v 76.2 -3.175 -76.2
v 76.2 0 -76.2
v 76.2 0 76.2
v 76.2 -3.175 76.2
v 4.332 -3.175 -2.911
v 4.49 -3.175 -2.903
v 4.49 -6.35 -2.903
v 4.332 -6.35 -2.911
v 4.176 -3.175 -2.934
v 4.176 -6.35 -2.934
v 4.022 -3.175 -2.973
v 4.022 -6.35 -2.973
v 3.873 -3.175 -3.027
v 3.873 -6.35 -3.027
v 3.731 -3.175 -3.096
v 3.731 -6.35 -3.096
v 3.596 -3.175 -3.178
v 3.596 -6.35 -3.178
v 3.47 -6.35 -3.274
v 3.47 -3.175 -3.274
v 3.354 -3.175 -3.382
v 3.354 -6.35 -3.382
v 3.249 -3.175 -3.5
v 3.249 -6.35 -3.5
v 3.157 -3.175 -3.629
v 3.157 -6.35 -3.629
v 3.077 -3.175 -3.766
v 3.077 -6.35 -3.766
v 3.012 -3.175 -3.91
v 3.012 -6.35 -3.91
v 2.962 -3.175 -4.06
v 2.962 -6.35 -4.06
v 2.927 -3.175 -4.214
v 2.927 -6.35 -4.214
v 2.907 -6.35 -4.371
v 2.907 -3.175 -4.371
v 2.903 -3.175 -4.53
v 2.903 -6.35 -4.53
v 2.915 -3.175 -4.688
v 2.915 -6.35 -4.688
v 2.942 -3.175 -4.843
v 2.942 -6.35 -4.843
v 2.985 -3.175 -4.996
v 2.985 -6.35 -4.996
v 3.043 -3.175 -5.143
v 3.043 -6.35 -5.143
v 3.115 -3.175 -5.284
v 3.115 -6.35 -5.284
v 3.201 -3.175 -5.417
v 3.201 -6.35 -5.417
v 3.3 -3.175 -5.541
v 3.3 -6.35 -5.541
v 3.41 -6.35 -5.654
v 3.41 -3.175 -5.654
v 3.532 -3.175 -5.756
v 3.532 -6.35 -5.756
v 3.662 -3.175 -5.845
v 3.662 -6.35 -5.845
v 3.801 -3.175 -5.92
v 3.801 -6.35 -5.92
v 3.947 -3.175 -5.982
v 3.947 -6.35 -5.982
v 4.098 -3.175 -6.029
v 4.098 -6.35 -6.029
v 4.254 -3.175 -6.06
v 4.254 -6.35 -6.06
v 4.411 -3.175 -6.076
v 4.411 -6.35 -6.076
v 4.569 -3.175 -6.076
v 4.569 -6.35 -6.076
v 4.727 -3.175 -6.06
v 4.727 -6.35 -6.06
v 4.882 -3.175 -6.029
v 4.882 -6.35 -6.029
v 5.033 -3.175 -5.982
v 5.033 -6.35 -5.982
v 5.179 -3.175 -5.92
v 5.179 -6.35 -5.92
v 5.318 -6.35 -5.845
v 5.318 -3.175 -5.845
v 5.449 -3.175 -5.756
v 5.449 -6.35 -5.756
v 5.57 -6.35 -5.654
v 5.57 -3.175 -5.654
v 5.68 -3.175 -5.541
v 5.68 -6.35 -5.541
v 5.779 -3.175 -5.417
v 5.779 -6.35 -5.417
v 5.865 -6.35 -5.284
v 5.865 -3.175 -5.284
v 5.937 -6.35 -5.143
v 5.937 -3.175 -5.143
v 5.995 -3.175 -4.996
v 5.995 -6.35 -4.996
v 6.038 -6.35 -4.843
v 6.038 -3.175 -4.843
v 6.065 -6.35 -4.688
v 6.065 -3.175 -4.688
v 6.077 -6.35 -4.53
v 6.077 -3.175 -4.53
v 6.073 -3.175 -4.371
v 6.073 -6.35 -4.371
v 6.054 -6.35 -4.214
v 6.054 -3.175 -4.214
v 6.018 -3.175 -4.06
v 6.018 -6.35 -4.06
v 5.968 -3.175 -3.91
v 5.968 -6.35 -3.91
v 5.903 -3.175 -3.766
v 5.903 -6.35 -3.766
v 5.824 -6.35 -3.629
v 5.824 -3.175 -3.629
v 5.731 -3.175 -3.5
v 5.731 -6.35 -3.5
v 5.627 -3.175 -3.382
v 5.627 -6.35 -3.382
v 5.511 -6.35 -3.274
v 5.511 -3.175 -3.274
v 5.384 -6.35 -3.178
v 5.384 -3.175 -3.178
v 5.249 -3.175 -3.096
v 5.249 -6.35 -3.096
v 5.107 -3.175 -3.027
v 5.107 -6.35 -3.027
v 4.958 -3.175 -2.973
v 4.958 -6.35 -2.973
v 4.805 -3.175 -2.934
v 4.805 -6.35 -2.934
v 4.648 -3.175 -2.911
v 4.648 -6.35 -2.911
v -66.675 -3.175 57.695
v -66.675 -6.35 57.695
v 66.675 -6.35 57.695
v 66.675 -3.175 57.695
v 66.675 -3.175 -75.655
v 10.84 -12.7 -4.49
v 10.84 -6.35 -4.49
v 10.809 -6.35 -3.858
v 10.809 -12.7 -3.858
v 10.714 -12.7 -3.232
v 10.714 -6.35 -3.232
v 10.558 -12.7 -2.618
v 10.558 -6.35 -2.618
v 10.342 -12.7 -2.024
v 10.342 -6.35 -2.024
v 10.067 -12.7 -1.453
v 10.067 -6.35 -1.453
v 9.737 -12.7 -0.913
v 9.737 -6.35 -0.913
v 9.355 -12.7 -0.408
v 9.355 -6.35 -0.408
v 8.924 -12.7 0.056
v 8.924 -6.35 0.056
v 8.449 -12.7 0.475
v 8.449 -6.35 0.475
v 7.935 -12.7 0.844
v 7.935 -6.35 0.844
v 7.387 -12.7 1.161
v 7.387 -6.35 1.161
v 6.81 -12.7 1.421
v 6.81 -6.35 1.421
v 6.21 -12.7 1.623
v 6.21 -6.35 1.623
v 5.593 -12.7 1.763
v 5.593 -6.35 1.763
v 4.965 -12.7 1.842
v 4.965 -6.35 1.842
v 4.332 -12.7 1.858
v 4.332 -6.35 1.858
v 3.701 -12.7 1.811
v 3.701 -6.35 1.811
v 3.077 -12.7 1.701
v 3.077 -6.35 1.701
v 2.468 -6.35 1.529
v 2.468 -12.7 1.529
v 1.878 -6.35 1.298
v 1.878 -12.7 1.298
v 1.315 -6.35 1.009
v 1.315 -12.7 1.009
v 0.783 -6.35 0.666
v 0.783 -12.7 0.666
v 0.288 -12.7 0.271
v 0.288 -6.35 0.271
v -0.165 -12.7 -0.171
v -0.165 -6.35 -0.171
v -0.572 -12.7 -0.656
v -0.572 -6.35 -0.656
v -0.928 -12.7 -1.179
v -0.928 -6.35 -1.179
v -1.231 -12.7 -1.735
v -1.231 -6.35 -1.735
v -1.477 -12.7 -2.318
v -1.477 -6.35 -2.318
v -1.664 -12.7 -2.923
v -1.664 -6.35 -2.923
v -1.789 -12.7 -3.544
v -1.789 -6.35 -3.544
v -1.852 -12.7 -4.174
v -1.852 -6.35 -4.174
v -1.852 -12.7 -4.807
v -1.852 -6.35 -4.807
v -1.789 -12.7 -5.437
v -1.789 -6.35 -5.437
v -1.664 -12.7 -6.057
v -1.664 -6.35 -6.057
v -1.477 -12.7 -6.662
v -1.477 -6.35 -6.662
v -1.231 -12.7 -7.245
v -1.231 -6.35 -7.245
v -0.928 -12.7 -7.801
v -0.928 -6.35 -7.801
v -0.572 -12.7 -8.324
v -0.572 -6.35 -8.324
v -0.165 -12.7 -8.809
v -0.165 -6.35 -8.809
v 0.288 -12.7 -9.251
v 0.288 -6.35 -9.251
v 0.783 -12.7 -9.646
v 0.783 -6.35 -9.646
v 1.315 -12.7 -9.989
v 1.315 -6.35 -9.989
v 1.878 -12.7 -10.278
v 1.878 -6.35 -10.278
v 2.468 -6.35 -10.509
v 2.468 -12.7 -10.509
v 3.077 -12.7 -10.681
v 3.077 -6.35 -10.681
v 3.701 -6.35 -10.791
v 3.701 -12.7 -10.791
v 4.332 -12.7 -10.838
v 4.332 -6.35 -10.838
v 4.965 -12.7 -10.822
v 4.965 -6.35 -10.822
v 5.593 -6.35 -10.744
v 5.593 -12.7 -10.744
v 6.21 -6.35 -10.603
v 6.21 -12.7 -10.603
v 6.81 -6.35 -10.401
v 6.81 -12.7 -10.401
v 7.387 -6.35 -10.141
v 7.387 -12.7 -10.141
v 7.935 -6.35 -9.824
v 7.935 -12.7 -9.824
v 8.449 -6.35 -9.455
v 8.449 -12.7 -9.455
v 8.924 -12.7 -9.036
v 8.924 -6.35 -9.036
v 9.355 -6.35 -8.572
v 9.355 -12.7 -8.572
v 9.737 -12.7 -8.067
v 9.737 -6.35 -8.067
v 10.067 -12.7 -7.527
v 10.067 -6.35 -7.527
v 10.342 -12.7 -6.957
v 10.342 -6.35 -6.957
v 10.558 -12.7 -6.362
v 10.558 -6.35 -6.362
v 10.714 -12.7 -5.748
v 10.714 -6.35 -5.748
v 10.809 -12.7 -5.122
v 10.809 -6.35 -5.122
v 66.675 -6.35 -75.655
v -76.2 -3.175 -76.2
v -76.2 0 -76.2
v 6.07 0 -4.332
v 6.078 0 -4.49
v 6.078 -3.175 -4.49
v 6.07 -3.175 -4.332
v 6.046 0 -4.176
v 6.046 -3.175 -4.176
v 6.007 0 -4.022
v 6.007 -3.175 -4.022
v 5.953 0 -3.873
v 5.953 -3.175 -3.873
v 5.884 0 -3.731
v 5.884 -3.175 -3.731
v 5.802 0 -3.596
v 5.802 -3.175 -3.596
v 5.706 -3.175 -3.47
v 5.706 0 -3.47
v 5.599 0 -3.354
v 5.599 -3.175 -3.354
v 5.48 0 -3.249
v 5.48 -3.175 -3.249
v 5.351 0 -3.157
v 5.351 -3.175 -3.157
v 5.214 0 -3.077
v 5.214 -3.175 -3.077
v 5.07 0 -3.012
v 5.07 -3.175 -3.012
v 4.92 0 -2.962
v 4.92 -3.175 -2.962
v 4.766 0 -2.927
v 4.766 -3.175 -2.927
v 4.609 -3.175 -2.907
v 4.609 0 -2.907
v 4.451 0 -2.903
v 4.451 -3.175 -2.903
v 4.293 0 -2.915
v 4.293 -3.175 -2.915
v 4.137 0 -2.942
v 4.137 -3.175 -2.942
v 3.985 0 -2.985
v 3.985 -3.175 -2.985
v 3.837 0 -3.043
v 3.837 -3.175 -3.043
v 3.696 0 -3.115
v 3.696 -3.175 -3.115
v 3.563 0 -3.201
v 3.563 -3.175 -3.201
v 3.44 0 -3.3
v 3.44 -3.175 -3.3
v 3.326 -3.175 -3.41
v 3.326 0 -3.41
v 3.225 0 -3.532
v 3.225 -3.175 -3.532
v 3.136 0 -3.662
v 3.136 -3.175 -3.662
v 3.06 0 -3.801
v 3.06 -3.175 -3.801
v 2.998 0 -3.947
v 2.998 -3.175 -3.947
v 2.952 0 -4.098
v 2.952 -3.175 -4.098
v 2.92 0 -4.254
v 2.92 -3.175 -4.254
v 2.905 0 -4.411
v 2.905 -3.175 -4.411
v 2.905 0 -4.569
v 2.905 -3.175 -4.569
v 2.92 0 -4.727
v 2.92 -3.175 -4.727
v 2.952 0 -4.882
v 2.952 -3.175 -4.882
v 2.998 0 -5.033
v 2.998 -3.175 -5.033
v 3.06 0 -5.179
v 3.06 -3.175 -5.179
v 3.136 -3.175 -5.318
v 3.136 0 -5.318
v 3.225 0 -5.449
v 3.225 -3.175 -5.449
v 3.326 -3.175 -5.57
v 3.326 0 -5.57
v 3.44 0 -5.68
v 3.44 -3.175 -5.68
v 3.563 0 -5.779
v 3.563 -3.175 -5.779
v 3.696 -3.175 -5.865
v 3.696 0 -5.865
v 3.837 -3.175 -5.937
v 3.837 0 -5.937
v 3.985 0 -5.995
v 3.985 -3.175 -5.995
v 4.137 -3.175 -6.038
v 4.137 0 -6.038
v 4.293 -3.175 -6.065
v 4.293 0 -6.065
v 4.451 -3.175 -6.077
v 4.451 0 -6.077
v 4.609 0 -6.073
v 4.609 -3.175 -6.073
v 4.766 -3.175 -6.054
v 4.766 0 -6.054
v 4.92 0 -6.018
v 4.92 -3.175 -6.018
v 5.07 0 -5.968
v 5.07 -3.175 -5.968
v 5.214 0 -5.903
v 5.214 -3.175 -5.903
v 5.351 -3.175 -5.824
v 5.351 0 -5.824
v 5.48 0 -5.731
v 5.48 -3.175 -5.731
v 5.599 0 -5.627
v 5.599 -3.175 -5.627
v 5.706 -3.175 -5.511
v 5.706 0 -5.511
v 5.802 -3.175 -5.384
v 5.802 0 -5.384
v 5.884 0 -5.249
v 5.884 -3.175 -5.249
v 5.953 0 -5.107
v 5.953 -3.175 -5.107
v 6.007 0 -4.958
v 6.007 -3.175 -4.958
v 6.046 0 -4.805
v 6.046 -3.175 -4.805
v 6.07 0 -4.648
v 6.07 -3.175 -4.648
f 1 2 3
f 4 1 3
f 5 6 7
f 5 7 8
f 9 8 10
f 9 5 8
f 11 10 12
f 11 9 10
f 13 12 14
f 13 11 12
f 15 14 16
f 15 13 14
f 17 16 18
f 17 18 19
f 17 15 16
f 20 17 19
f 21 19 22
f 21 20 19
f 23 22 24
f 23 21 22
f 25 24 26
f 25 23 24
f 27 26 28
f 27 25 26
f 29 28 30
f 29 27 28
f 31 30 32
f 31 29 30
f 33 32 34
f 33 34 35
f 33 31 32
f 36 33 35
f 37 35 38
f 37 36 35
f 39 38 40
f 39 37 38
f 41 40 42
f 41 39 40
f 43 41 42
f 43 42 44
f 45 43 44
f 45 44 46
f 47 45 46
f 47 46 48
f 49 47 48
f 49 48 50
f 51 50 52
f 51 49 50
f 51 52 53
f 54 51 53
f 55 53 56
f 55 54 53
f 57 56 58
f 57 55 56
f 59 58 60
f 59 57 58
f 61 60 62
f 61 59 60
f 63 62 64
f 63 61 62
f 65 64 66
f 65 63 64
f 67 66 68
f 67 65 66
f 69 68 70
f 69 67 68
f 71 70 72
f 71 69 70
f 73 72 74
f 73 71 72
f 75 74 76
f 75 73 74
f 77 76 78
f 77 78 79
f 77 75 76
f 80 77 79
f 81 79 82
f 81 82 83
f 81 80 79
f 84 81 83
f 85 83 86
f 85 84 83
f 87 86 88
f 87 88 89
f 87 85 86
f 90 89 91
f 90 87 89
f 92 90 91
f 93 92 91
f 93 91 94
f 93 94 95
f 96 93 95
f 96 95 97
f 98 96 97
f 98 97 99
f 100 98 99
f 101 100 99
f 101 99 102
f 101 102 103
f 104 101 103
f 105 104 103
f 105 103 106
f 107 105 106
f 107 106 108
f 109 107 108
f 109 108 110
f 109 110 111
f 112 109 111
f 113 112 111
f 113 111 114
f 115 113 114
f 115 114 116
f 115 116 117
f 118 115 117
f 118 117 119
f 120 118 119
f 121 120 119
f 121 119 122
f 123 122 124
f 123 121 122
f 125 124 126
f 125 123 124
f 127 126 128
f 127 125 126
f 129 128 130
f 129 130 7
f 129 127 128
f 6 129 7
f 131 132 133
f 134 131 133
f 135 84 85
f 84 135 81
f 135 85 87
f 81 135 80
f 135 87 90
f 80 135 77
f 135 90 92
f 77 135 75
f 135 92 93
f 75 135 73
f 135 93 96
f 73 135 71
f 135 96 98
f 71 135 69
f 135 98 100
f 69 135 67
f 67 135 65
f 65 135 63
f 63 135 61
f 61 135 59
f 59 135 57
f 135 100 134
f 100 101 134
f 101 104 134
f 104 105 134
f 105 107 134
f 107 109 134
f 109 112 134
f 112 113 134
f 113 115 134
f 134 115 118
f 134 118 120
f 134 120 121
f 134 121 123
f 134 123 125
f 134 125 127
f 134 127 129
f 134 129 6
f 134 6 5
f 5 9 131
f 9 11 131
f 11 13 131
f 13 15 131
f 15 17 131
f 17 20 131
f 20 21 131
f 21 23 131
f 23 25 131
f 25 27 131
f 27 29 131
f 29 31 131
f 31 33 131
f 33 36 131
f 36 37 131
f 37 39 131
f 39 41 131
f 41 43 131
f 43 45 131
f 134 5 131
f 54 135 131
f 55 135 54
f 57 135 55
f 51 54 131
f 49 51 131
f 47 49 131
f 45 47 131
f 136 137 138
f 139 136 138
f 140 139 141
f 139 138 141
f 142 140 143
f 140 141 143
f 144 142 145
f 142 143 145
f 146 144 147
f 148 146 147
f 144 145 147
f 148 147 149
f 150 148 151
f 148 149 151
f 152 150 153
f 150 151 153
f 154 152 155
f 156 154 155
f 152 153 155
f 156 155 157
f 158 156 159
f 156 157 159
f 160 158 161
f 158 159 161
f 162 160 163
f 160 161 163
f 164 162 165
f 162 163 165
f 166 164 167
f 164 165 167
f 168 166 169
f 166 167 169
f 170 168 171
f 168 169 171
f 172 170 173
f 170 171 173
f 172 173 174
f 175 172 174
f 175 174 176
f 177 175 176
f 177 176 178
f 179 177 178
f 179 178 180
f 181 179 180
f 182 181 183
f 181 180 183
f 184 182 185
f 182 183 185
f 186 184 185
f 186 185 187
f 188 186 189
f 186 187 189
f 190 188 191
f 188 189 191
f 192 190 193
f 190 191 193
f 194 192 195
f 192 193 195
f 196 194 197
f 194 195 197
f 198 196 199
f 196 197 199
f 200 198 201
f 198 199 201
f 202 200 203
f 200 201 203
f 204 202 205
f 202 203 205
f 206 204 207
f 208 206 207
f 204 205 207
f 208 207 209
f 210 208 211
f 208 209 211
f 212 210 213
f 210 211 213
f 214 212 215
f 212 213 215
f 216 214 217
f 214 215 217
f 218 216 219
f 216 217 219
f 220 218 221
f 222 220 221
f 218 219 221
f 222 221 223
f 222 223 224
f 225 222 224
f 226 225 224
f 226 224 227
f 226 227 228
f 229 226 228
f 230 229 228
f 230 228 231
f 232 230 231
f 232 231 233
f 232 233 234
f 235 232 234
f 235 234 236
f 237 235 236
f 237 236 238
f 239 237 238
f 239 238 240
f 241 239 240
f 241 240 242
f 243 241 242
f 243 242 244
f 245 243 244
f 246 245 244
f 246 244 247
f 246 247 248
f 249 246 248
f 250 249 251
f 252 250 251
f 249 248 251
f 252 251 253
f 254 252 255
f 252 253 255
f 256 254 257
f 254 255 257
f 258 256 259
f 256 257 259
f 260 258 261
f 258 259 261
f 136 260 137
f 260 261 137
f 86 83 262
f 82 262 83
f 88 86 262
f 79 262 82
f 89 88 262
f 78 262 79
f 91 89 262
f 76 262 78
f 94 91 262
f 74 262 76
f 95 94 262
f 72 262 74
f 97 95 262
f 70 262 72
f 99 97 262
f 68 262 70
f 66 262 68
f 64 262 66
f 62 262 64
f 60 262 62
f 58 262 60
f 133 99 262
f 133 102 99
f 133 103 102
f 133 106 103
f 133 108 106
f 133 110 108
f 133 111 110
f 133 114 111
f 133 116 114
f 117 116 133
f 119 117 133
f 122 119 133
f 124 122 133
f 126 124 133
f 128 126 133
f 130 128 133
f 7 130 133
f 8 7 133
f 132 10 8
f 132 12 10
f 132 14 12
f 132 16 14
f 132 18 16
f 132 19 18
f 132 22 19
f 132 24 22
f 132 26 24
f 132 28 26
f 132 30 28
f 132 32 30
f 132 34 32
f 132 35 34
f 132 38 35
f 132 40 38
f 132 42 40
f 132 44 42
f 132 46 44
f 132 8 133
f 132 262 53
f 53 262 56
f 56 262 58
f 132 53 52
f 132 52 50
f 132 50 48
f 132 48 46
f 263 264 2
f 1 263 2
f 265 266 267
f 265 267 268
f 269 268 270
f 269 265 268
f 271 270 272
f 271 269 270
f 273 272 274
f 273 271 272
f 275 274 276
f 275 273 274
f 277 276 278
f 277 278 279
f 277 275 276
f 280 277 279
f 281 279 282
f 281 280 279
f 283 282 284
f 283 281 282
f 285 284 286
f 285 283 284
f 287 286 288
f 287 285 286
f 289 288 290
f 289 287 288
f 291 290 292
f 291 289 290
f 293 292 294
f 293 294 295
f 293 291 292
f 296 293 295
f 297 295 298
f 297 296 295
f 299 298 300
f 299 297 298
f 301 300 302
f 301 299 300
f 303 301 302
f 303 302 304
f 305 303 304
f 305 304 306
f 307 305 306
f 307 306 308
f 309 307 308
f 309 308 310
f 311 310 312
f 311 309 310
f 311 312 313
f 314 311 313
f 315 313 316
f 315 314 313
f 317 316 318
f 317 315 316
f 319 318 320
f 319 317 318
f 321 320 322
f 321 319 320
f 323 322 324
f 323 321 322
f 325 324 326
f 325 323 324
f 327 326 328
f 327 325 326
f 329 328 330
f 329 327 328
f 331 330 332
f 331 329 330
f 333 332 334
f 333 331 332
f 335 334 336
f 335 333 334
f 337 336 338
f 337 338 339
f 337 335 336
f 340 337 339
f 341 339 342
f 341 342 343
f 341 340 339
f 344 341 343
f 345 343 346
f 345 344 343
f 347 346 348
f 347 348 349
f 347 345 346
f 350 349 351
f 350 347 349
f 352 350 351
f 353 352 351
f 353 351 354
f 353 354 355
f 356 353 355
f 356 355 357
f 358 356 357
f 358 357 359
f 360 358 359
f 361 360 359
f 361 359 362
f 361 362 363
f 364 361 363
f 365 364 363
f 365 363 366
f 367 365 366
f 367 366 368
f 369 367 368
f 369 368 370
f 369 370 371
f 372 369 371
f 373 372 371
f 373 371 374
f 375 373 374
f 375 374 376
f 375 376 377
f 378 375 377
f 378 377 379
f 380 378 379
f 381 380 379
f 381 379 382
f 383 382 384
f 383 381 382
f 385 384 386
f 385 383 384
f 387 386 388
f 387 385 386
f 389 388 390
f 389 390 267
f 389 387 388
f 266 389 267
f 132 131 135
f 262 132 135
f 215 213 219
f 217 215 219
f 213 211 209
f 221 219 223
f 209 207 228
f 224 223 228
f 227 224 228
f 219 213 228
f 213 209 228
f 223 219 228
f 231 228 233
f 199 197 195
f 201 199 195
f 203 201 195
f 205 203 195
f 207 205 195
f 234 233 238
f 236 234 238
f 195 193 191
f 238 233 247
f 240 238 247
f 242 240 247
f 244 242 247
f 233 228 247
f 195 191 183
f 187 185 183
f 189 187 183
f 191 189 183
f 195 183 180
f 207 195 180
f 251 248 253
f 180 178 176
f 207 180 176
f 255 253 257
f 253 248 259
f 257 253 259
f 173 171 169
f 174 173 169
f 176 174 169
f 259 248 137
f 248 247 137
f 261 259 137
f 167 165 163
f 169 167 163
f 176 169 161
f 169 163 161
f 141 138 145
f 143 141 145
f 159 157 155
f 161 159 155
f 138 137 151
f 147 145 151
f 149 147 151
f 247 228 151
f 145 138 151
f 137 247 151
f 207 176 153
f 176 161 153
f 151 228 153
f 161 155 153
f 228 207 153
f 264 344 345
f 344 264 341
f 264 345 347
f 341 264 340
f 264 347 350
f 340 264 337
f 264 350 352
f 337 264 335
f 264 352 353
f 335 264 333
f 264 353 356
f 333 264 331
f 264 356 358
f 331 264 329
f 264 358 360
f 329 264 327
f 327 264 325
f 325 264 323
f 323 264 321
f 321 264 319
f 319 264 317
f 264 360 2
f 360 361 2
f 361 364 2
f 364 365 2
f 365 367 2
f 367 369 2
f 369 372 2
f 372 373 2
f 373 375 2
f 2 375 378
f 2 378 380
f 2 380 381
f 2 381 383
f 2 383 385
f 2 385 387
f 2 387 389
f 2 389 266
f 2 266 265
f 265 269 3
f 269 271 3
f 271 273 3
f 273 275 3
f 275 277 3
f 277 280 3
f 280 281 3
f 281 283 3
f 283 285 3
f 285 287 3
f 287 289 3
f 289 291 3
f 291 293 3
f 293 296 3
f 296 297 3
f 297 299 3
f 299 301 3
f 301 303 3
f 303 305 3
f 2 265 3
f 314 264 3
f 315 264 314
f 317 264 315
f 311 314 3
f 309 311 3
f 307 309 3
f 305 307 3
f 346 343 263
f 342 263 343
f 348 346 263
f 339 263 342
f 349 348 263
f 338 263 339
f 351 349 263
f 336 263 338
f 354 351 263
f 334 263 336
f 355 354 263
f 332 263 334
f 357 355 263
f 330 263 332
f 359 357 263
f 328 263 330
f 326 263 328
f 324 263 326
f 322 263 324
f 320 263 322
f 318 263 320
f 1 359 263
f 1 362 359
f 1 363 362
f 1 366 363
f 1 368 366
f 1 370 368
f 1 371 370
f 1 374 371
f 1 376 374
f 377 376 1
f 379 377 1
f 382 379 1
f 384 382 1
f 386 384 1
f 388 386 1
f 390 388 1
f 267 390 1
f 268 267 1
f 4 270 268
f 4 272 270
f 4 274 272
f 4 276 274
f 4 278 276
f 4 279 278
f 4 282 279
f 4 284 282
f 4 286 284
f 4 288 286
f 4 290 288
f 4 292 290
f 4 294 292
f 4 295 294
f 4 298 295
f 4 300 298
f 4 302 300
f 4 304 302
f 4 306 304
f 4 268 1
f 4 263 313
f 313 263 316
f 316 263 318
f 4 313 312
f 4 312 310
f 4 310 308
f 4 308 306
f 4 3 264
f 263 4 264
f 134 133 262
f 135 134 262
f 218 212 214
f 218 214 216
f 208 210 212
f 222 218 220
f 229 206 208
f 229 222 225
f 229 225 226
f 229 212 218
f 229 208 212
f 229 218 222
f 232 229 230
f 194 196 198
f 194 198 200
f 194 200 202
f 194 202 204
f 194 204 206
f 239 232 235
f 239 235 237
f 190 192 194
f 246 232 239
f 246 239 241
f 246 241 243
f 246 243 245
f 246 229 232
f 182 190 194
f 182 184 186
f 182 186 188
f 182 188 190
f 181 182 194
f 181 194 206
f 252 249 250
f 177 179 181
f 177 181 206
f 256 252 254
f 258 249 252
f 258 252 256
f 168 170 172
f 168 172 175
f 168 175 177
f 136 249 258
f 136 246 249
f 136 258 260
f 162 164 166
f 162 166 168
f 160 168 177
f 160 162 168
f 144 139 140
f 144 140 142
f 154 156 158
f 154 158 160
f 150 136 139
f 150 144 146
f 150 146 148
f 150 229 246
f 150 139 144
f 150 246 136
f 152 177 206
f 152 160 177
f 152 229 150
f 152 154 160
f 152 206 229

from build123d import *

# Parameters (mm, degrees)
F0_R     = 1.5875
F1_DEPTH = 3.175
F4_ANGLE = 90
F6_R     = 6.35
F7_DEPTH = 6.35
F9_DEPTH = 3.175


with BuildPart() as f1:
    # F0 (on Front) → F1 (new body)
    with BuildSketch(Plane.XZ):
        Polygon((76.2, 76.2), (-76.2, -76.2), (76.2, -76.2), align=None)
        with Locations((4.4901280605, -4.4901280605)):
            Circle(F0_R, mode=Mode.SUBTRACT)
    extrude(amount=F1_DEPTH)


with BuildPart() as f4_1:
    # F4: copy of F1
    add(f1.part.rotate(Axis((4.4901280605, -59.5605373383, -4.4901280605), (0, -1, 0)), F4_ANGLE))


with BuildPart() as f4_1_1:
    # F5: moved
    add(f4_1.part.moved(Location((0, -3.175, 0))))

    # F8 (on face) → F9 (cut)
    with BuildSketch(Plane.XZ.offset(6.35)):
        Polygon((66.675, 57.6947438789), (66.675, -75.6552561211), (76.2, -85.1802561211), (76.2, 67.2197438789), (-76.2, 67.2197438789), (-66.675, 57.6947438789), align=None)
    extrude(amount=-F9_DEPTH, mode=Mode.SUBTRACT)


with BuildPart() as f7:
    # F6 (on face) → F7 (new body)
    with BuildSketch(Plane.XZ.offset(6.35)):
        with Locations((4.4901280605, -4.4901280605)):
            Circle(F6_R)
    extrude(amount=F7_DEPTH)


solid = Compound([f1.part, f4_1_1.part, f7.part])
